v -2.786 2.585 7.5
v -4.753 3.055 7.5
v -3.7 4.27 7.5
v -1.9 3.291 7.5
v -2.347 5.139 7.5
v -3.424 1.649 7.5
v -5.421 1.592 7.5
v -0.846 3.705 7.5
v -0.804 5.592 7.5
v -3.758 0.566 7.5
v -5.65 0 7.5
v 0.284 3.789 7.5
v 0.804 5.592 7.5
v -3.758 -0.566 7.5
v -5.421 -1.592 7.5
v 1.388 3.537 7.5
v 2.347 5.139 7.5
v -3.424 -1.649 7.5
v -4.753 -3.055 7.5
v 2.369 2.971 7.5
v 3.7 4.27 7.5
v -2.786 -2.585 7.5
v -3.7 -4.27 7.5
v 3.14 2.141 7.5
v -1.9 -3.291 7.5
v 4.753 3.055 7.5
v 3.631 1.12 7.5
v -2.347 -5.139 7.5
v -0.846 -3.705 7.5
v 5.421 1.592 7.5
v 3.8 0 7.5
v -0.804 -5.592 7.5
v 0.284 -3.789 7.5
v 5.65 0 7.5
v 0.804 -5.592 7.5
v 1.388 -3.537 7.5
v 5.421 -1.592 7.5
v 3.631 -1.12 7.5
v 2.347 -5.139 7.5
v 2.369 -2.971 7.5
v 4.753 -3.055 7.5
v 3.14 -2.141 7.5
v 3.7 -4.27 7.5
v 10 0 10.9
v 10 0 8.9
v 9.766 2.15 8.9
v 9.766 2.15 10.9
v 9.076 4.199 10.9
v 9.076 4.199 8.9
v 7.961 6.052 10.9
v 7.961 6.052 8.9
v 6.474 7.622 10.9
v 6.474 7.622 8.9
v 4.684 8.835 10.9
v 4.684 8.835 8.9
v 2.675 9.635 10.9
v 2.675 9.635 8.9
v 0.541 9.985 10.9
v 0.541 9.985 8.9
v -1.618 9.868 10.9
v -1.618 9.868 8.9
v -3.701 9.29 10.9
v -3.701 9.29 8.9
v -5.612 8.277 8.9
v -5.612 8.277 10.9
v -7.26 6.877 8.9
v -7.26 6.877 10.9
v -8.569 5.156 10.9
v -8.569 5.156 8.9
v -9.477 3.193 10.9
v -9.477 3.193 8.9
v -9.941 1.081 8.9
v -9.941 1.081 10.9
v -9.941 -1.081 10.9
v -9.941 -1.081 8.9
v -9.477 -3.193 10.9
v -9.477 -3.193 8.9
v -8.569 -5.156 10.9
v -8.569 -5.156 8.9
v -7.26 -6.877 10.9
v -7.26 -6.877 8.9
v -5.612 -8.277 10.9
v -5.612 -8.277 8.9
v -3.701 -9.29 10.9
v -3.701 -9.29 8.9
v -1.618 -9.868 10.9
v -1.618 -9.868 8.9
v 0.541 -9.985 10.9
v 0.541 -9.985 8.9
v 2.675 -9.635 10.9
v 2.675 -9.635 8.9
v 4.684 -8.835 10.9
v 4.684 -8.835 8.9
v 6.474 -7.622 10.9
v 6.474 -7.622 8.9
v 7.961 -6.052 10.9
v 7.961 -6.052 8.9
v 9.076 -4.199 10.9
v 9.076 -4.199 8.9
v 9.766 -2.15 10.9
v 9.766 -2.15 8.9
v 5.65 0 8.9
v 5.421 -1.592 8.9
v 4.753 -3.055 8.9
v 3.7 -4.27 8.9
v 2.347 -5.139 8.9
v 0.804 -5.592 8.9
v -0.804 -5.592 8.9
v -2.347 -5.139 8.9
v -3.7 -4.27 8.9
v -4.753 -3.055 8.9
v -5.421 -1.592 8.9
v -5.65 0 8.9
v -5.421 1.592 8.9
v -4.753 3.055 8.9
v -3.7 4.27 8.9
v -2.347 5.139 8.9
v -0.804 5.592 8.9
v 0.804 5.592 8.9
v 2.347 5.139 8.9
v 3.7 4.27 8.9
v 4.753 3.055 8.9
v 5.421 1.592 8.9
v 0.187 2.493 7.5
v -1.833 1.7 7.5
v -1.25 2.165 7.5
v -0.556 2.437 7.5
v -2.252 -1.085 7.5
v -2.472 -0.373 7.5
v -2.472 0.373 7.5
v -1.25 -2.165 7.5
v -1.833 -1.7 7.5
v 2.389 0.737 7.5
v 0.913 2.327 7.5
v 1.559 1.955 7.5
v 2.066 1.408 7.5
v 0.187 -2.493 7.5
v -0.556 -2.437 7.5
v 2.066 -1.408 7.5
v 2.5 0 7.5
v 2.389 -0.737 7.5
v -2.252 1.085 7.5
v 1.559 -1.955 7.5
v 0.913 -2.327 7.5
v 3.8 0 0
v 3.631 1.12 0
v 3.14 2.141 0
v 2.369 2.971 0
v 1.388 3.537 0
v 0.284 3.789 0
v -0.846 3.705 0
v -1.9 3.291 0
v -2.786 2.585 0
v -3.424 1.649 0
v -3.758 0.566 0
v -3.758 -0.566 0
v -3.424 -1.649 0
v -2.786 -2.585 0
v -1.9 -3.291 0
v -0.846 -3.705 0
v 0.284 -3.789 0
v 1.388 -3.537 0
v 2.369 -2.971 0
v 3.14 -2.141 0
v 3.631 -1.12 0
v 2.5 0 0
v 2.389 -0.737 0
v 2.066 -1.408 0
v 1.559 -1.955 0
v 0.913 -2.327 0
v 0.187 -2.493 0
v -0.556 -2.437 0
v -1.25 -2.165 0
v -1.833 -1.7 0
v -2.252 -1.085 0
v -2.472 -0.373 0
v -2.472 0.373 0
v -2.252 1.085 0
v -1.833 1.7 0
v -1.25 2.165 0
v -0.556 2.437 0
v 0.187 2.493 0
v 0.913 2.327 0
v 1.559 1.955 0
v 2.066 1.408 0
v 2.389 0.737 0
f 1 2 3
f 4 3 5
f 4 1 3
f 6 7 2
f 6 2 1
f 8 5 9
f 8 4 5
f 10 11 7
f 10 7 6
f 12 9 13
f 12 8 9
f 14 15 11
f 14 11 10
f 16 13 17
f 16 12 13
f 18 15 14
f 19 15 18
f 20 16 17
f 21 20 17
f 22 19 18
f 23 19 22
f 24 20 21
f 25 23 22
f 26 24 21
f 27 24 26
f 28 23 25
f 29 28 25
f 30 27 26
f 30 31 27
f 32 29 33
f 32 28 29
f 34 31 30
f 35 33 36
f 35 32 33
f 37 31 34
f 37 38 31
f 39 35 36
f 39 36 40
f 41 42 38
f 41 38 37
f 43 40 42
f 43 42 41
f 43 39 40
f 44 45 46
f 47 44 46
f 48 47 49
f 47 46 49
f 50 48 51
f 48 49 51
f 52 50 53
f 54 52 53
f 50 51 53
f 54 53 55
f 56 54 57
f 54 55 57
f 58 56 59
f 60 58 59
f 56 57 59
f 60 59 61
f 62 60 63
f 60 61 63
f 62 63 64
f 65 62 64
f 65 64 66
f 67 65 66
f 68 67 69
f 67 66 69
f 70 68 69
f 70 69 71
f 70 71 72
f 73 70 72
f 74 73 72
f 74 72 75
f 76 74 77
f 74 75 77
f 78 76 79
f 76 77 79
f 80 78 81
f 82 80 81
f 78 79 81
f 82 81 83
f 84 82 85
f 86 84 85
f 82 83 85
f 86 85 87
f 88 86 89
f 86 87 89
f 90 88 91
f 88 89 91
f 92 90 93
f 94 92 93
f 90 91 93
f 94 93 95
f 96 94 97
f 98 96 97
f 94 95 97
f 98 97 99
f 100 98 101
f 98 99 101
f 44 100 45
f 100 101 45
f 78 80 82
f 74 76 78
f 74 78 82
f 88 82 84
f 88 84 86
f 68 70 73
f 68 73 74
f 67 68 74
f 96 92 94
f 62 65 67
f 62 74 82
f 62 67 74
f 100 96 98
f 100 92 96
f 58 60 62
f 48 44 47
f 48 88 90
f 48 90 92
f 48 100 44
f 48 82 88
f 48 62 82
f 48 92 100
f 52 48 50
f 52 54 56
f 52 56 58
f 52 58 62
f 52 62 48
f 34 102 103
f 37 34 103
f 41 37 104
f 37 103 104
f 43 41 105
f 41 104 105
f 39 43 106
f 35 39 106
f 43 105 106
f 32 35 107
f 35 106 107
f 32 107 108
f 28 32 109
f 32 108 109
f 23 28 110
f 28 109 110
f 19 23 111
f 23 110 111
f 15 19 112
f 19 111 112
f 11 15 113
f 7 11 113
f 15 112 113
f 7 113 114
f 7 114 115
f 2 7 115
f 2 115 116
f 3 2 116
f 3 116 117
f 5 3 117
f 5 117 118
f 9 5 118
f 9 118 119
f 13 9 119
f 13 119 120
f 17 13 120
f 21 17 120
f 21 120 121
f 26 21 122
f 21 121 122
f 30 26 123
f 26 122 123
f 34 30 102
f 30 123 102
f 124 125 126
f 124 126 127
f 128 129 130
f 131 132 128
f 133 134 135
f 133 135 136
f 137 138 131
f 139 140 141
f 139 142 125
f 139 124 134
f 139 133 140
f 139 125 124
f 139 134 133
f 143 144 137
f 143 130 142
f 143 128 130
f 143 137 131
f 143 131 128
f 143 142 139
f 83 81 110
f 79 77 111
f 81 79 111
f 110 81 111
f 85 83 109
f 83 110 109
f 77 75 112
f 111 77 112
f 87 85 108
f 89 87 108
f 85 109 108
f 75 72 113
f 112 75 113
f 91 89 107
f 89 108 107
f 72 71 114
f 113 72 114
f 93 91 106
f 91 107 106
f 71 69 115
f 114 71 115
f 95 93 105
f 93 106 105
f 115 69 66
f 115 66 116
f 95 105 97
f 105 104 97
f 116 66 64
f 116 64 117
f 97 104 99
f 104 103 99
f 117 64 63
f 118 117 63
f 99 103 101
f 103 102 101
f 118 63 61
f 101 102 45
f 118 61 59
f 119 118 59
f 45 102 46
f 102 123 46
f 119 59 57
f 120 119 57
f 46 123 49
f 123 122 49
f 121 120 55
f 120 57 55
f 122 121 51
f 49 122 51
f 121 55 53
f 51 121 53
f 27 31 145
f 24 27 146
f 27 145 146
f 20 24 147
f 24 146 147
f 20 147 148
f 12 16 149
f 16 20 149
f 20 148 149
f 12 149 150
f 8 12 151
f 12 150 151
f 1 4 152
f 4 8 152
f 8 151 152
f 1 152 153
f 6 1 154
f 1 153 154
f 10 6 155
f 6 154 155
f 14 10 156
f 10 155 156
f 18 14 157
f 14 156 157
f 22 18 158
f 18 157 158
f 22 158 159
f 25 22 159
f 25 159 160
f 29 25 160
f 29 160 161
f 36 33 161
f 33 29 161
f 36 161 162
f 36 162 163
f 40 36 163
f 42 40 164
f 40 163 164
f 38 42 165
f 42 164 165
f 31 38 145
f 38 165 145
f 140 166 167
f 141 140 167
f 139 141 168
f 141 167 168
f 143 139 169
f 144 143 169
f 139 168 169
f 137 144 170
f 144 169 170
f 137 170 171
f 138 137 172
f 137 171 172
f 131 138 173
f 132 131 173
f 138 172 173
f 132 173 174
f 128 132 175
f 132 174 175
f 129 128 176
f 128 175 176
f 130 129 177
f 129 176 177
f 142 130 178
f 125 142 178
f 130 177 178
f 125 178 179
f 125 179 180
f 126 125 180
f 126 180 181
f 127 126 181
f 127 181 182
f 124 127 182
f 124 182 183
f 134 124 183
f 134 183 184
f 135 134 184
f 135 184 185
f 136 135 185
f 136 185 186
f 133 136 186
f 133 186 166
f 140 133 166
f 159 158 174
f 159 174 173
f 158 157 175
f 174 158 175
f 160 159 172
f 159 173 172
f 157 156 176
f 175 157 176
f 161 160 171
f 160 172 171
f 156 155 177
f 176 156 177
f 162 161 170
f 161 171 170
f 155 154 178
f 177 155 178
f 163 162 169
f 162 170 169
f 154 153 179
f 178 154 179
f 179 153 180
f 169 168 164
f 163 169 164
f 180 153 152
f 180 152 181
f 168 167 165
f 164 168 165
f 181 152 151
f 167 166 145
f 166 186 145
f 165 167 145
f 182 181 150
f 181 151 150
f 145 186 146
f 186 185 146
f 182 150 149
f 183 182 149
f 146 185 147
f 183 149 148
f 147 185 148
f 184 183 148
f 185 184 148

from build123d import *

# Parameters (mm, degrees)
F0_R     = 3.8
F1_DEPTH = 8.9
F2_R     = 10
F3_DEPTH = 2
F4_R     = 2.5
F5_DEPTH = 8.3
F6_R     = 5.65
F7_DEPTH = 1.4


with BuildPart() as f1:
    # F0 (on Top) → F1 (new body)
    with BuildSketch(Plane.XY):
        Circle(F0_R)
    extrude(amount=F1_DEPTH)

    # F2 (on face) → F3 (join)
    with BuildSketch(Plane.XY.offset(8.9)):
        Circle(F2_R)
    extrude(amount=F3_DEPTH)

    # F4 (on face) → F5 (cut)
    with BuildSketch(Plane(origin=(0, 0, 0), x_dir=(1, 0, 0), z_dir=(0, 0, -1))):
        Circle(F4_R)
    extrude(amount=-F5_DEPTH, mode=Mode.SUBTRACT)

    # F6 (on face) → F7 (join)
    with BuildSketch(Plane(origin=(0, 0, 8.9), x_dir=(1, 0, 0), z_dir=(0, 0, -1))):
        Circle(F6_R)
    extrude(amount=F7_DEPTH)


solid = f1.part
